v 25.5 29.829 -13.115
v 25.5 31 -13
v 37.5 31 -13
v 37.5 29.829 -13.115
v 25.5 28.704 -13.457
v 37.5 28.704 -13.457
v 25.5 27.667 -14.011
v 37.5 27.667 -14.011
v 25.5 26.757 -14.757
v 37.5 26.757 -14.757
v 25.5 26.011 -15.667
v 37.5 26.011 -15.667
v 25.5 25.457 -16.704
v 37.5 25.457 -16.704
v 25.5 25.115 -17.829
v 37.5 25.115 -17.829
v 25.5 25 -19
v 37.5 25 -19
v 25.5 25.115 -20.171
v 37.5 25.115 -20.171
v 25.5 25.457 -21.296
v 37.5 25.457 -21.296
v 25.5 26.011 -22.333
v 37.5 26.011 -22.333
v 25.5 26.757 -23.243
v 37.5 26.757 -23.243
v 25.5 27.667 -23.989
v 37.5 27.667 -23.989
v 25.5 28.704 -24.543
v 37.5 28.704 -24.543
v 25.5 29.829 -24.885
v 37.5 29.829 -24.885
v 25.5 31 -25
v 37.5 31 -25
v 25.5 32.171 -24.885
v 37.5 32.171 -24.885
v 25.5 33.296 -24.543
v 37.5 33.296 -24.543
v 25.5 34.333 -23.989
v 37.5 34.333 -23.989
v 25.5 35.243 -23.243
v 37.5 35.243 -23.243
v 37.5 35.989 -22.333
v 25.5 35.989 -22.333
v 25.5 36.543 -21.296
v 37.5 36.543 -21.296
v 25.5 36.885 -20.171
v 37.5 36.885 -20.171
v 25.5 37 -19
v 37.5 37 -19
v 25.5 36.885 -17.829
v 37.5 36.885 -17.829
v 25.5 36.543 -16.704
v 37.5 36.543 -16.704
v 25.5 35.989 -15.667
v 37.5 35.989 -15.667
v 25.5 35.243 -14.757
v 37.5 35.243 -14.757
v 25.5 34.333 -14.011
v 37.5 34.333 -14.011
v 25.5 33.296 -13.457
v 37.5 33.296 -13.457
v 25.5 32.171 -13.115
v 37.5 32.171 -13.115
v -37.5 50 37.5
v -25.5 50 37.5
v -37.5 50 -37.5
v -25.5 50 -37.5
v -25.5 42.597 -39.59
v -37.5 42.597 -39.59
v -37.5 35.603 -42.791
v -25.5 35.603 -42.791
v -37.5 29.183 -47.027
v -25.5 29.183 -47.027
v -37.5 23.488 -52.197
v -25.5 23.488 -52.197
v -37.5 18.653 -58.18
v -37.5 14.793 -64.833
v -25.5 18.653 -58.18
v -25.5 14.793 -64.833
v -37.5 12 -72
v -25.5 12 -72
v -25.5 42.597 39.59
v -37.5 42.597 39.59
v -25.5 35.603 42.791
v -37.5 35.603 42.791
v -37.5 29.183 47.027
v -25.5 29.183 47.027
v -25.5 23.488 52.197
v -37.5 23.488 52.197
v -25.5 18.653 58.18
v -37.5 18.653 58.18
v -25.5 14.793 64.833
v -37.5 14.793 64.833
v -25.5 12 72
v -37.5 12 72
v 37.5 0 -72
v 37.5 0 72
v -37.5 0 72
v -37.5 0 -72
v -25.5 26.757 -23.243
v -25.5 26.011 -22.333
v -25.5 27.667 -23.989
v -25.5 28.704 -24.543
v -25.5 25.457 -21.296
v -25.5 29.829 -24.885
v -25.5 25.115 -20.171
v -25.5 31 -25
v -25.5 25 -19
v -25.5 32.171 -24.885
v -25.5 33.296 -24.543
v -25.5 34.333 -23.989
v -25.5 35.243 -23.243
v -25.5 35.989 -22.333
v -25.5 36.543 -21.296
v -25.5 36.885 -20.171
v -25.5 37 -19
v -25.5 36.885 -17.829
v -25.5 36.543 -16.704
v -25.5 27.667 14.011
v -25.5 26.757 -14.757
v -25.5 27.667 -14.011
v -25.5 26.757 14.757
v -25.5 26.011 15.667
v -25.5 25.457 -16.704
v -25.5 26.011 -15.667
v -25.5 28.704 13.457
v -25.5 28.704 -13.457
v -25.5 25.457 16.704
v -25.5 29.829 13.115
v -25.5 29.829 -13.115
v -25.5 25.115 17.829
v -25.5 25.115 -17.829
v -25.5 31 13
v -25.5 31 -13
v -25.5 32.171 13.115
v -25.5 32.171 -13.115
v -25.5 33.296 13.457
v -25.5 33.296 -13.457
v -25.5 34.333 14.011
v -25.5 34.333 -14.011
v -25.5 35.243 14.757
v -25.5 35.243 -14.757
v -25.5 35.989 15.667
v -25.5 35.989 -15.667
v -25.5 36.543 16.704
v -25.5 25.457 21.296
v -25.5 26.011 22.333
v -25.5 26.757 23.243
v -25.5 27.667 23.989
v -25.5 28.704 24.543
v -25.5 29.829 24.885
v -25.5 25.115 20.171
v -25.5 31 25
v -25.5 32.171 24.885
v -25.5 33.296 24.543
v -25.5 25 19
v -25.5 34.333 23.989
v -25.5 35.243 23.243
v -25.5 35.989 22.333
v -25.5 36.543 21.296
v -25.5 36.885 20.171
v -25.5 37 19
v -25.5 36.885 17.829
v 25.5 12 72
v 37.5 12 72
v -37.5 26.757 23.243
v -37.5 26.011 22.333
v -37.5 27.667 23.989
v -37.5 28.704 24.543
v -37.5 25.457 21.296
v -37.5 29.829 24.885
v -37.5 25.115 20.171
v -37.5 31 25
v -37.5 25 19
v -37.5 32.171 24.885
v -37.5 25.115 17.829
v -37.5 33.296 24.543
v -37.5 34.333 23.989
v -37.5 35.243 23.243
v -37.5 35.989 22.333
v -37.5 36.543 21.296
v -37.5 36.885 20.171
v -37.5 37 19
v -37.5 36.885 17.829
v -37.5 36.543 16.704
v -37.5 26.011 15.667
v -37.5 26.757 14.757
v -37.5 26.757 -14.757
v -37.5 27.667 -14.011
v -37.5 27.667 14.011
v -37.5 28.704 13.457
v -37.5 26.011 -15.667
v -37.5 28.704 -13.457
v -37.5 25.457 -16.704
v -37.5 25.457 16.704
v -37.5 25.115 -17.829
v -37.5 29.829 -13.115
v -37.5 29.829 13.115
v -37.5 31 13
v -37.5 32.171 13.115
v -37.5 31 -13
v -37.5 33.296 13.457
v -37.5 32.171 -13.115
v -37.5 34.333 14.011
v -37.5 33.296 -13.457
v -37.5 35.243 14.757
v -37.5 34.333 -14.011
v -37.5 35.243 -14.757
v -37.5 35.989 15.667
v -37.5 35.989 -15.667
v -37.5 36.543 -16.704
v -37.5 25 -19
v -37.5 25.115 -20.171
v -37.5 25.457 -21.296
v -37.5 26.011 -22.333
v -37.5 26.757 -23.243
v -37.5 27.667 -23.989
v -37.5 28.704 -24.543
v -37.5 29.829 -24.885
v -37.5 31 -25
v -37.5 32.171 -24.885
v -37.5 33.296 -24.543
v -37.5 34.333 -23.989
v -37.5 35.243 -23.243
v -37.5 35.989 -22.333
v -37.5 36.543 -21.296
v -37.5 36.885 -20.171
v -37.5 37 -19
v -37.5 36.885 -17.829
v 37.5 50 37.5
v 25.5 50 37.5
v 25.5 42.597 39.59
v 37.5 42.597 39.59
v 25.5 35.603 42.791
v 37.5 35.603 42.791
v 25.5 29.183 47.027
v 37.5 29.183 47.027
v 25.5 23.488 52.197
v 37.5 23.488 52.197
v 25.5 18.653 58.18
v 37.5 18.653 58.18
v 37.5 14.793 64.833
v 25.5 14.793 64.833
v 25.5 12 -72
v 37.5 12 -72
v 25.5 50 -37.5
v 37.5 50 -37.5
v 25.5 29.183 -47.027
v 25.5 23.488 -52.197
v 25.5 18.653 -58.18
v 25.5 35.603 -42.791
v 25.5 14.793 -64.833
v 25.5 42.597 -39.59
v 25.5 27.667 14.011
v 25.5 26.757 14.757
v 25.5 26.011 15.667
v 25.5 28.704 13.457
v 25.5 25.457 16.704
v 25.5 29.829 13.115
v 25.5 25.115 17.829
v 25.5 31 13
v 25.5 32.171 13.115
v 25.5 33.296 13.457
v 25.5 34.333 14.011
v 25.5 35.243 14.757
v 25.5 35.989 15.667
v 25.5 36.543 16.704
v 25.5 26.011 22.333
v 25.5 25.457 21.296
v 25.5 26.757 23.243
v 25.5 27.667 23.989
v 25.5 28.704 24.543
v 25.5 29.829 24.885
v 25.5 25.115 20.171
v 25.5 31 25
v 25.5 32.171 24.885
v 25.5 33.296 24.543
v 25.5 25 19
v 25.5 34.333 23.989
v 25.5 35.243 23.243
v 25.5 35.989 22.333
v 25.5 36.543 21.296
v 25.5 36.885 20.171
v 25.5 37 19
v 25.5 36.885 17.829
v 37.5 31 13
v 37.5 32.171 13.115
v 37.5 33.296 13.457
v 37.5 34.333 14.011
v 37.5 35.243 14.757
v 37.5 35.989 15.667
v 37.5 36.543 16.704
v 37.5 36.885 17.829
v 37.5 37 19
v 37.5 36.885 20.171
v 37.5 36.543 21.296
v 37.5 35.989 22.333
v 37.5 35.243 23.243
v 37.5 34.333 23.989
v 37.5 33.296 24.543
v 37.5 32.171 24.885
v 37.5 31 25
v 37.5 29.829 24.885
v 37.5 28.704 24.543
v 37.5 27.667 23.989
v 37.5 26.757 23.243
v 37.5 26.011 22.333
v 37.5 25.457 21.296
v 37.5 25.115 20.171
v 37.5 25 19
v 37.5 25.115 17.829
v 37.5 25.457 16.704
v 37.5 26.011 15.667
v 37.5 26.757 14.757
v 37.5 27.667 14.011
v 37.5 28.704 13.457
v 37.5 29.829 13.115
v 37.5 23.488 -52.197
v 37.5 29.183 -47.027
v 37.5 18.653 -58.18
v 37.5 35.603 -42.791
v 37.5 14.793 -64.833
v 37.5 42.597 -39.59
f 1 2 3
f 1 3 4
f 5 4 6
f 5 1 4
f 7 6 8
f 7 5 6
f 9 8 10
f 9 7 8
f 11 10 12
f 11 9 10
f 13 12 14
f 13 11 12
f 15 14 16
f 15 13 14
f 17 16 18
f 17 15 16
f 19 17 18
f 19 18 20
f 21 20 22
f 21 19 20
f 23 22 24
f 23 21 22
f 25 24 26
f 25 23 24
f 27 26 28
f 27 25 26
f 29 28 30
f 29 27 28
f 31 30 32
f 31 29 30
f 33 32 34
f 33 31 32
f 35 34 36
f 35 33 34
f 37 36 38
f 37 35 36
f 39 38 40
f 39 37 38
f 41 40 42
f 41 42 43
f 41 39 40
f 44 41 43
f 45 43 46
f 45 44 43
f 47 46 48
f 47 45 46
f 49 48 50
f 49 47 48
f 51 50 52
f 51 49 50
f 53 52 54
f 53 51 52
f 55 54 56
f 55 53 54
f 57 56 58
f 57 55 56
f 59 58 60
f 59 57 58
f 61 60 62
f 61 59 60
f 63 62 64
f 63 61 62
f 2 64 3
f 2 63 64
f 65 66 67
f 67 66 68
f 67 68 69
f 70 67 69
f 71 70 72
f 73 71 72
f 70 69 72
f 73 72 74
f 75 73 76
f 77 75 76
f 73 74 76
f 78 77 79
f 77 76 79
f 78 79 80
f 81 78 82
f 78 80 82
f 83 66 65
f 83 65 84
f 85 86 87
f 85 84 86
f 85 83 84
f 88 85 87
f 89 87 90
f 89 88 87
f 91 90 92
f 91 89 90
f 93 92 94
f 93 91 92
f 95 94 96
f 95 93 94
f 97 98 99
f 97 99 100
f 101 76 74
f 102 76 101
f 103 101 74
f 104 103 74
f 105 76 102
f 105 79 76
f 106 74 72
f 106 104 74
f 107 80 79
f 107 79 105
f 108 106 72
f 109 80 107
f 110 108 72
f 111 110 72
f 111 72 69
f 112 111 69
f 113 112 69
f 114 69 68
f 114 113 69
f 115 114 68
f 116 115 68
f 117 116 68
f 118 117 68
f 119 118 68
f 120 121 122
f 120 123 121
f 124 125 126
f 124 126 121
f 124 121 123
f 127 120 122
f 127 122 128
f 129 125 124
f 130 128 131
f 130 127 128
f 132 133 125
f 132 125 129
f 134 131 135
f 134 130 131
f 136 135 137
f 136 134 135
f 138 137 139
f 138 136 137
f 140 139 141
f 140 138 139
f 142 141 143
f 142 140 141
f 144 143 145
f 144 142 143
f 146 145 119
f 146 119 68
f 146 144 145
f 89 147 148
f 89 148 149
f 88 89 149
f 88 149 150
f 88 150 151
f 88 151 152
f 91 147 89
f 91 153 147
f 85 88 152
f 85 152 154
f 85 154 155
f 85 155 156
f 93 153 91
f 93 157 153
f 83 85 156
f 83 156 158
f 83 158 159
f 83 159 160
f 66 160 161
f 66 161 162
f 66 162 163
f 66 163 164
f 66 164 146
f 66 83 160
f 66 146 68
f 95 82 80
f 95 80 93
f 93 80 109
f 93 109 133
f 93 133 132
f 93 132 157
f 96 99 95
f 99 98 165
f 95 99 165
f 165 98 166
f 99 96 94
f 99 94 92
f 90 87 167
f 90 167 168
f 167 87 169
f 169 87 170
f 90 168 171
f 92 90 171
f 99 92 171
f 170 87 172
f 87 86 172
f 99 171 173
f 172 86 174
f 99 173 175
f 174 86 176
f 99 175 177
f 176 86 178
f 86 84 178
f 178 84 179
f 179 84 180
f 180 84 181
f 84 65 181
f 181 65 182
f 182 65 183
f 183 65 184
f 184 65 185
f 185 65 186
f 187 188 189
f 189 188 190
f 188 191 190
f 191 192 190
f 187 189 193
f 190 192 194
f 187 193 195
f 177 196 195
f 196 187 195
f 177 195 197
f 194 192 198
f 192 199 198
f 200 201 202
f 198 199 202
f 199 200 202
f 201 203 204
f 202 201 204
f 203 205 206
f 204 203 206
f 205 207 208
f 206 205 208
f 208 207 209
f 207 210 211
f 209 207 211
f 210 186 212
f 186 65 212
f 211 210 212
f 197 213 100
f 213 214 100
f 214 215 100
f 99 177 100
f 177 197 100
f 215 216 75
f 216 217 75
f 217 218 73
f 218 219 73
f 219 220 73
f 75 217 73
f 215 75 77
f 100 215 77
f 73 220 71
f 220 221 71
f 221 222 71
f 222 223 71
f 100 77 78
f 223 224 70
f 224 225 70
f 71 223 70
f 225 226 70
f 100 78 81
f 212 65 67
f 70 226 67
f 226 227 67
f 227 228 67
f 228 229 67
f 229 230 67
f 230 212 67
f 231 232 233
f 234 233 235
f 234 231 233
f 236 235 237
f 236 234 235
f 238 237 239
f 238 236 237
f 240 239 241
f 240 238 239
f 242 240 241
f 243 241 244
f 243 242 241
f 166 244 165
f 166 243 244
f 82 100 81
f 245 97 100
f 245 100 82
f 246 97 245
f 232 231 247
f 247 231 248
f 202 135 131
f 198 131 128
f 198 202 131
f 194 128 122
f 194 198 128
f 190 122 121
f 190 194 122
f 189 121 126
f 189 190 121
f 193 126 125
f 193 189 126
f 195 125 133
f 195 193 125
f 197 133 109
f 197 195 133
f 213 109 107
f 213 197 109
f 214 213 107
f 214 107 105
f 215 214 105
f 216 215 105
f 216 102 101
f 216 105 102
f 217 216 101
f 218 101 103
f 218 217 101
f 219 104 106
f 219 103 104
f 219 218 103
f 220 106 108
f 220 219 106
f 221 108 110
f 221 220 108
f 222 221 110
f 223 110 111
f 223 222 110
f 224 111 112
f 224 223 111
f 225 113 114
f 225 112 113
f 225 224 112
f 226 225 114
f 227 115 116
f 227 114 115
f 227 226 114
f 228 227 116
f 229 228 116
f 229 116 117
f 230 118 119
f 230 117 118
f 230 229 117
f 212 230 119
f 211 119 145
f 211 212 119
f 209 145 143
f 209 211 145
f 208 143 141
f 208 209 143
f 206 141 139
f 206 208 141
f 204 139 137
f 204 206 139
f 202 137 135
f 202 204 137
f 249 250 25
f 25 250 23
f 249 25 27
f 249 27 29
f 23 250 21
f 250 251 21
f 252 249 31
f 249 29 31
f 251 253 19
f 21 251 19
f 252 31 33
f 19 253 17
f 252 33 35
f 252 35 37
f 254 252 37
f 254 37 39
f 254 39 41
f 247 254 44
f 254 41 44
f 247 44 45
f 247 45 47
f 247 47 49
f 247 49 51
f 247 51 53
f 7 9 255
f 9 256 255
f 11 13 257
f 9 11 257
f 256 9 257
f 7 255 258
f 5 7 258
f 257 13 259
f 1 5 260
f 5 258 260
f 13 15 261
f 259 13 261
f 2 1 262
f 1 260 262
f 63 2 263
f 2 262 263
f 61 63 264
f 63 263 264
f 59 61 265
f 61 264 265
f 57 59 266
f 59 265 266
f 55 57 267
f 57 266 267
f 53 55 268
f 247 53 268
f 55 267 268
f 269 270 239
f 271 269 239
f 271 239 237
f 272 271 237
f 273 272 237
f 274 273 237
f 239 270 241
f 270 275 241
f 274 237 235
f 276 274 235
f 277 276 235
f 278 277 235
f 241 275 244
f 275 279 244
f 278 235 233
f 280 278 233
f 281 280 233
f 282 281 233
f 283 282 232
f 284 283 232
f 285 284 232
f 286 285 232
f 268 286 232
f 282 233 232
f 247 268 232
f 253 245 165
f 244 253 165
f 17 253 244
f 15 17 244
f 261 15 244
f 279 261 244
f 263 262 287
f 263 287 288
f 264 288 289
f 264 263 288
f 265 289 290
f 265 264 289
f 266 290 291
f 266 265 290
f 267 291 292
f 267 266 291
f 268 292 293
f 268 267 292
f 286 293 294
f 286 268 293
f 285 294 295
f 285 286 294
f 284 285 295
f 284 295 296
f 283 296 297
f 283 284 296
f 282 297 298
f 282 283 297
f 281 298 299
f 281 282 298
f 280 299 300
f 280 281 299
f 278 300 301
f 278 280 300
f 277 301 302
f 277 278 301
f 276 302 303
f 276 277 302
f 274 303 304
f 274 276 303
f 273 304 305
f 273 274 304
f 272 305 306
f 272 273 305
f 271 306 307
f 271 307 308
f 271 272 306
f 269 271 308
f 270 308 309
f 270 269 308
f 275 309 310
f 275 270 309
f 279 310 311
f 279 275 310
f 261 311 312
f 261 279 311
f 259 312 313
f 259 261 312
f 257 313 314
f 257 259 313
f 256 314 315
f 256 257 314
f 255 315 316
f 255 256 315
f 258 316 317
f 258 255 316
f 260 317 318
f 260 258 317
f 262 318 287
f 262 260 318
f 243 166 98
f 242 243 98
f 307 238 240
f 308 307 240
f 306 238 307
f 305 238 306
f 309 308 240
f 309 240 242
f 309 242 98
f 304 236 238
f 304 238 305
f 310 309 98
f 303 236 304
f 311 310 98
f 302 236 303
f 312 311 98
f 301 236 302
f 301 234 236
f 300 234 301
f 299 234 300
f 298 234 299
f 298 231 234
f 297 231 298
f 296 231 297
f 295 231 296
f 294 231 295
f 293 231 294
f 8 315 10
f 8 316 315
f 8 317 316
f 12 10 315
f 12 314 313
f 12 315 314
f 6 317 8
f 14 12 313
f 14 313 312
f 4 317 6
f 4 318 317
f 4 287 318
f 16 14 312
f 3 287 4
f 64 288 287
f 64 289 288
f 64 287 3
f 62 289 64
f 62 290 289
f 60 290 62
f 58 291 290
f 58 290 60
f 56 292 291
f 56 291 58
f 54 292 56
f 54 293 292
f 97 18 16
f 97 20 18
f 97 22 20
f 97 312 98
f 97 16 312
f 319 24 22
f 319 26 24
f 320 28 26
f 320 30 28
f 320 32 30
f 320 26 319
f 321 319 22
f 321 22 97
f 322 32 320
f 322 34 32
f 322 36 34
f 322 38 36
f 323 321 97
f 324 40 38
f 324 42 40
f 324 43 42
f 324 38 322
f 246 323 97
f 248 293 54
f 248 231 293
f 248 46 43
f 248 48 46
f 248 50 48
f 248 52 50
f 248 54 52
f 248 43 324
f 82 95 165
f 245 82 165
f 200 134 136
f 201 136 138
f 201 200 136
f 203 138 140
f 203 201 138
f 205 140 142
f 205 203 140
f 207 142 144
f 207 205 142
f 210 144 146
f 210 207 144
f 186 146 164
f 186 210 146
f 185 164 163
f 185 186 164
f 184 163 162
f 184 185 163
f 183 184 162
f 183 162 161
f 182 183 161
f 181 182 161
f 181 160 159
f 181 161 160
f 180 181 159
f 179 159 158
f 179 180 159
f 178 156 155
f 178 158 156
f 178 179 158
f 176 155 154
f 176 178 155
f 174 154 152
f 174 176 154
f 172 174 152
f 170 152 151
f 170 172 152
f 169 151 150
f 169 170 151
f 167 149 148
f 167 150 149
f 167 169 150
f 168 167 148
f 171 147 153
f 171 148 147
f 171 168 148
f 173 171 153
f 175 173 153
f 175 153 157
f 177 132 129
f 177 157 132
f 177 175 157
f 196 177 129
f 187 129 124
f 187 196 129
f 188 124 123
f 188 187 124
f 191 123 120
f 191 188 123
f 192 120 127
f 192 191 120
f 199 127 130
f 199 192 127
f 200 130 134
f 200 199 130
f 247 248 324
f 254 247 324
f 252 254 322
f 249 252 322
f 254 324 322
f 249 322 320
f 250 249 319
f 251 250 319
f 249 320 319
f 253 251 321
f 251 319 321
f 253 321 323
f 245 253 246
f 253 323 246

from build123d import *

# Parameters (mm, degrees)
SKETCH1_W           = 144
SKETCH1_H           = 50
SKETCH1_R           = 6
BOSS_EXTRUDE1_DEPTH = 37.5
SKETCH2_W           = 51
SKETCH2_H           = 38
CUT_EXTRUDE1_DEPTH  = 157.978501713
CUT_EXTRUDE2_DEPTH  = 116.364639296


with BuildPart() as part:
    # Sketch1 → Boss-Extrude1 (new, symmetric)
    with BuildSketch(Plane(origin=(0, 0, 0), x_dir=(0, 0, -1), z_dir=(1, 0, 0))):
        with Locations((0, 25)):
            Rectangle(SKETCH1_W, SKETCH1_H)
        with Locations((-19, 31)):
            Circle(SKETCH1_R, mode=Mode.SUBTRACT)
        with Locations(Location((19, 31, 0), (0, 0, 180))):
            Circle(SKETCH1_R, mode=Mode.SUBTRACT)
    extrude(amount=BOSS_EXTRUDE1_DEPTH, both=True)

    # Sketch2 → Cut-Extrude1 (cut, through all)
    with BuildSketch(Plane.XY.offset(72)):
        with Locations((0, 31)):
            Rectangle(SKETCH2_W, SKETCH2_H)
    extrude(amount=-CUT_EXTRUDE1_DEPTH, mode=Mode.SUBTRACT)

    # Sketch3 → Cut-Extrude2 (cut, through all)
    with BuildSketch(Plane(origin=(37.5, 0, 0), x_dir=(0, 0, -1), z_dir=(1, 0, 0))):
        with BuildLine():
            Line((72, 12), (72, 50))
            Line((72, 50), (37.5, 50))
            ThreePointArc((37.5, 50), (49.502162082, 26.235515574), (72, 12))
        make_face()
        with BuildLine():
            Line((-72, 50), (-37.5, 50))
            ThreePointArc((-37.5, 50), (-49.502162082, 26.235515574), (-72, 12))
            Line((-72, 12), (-72, 50))
        make_face()
    extrude(amount=-CUT_EXTRUDE2_DEPTH, mode=Mode.SUBTRACT)


solid = part.part
